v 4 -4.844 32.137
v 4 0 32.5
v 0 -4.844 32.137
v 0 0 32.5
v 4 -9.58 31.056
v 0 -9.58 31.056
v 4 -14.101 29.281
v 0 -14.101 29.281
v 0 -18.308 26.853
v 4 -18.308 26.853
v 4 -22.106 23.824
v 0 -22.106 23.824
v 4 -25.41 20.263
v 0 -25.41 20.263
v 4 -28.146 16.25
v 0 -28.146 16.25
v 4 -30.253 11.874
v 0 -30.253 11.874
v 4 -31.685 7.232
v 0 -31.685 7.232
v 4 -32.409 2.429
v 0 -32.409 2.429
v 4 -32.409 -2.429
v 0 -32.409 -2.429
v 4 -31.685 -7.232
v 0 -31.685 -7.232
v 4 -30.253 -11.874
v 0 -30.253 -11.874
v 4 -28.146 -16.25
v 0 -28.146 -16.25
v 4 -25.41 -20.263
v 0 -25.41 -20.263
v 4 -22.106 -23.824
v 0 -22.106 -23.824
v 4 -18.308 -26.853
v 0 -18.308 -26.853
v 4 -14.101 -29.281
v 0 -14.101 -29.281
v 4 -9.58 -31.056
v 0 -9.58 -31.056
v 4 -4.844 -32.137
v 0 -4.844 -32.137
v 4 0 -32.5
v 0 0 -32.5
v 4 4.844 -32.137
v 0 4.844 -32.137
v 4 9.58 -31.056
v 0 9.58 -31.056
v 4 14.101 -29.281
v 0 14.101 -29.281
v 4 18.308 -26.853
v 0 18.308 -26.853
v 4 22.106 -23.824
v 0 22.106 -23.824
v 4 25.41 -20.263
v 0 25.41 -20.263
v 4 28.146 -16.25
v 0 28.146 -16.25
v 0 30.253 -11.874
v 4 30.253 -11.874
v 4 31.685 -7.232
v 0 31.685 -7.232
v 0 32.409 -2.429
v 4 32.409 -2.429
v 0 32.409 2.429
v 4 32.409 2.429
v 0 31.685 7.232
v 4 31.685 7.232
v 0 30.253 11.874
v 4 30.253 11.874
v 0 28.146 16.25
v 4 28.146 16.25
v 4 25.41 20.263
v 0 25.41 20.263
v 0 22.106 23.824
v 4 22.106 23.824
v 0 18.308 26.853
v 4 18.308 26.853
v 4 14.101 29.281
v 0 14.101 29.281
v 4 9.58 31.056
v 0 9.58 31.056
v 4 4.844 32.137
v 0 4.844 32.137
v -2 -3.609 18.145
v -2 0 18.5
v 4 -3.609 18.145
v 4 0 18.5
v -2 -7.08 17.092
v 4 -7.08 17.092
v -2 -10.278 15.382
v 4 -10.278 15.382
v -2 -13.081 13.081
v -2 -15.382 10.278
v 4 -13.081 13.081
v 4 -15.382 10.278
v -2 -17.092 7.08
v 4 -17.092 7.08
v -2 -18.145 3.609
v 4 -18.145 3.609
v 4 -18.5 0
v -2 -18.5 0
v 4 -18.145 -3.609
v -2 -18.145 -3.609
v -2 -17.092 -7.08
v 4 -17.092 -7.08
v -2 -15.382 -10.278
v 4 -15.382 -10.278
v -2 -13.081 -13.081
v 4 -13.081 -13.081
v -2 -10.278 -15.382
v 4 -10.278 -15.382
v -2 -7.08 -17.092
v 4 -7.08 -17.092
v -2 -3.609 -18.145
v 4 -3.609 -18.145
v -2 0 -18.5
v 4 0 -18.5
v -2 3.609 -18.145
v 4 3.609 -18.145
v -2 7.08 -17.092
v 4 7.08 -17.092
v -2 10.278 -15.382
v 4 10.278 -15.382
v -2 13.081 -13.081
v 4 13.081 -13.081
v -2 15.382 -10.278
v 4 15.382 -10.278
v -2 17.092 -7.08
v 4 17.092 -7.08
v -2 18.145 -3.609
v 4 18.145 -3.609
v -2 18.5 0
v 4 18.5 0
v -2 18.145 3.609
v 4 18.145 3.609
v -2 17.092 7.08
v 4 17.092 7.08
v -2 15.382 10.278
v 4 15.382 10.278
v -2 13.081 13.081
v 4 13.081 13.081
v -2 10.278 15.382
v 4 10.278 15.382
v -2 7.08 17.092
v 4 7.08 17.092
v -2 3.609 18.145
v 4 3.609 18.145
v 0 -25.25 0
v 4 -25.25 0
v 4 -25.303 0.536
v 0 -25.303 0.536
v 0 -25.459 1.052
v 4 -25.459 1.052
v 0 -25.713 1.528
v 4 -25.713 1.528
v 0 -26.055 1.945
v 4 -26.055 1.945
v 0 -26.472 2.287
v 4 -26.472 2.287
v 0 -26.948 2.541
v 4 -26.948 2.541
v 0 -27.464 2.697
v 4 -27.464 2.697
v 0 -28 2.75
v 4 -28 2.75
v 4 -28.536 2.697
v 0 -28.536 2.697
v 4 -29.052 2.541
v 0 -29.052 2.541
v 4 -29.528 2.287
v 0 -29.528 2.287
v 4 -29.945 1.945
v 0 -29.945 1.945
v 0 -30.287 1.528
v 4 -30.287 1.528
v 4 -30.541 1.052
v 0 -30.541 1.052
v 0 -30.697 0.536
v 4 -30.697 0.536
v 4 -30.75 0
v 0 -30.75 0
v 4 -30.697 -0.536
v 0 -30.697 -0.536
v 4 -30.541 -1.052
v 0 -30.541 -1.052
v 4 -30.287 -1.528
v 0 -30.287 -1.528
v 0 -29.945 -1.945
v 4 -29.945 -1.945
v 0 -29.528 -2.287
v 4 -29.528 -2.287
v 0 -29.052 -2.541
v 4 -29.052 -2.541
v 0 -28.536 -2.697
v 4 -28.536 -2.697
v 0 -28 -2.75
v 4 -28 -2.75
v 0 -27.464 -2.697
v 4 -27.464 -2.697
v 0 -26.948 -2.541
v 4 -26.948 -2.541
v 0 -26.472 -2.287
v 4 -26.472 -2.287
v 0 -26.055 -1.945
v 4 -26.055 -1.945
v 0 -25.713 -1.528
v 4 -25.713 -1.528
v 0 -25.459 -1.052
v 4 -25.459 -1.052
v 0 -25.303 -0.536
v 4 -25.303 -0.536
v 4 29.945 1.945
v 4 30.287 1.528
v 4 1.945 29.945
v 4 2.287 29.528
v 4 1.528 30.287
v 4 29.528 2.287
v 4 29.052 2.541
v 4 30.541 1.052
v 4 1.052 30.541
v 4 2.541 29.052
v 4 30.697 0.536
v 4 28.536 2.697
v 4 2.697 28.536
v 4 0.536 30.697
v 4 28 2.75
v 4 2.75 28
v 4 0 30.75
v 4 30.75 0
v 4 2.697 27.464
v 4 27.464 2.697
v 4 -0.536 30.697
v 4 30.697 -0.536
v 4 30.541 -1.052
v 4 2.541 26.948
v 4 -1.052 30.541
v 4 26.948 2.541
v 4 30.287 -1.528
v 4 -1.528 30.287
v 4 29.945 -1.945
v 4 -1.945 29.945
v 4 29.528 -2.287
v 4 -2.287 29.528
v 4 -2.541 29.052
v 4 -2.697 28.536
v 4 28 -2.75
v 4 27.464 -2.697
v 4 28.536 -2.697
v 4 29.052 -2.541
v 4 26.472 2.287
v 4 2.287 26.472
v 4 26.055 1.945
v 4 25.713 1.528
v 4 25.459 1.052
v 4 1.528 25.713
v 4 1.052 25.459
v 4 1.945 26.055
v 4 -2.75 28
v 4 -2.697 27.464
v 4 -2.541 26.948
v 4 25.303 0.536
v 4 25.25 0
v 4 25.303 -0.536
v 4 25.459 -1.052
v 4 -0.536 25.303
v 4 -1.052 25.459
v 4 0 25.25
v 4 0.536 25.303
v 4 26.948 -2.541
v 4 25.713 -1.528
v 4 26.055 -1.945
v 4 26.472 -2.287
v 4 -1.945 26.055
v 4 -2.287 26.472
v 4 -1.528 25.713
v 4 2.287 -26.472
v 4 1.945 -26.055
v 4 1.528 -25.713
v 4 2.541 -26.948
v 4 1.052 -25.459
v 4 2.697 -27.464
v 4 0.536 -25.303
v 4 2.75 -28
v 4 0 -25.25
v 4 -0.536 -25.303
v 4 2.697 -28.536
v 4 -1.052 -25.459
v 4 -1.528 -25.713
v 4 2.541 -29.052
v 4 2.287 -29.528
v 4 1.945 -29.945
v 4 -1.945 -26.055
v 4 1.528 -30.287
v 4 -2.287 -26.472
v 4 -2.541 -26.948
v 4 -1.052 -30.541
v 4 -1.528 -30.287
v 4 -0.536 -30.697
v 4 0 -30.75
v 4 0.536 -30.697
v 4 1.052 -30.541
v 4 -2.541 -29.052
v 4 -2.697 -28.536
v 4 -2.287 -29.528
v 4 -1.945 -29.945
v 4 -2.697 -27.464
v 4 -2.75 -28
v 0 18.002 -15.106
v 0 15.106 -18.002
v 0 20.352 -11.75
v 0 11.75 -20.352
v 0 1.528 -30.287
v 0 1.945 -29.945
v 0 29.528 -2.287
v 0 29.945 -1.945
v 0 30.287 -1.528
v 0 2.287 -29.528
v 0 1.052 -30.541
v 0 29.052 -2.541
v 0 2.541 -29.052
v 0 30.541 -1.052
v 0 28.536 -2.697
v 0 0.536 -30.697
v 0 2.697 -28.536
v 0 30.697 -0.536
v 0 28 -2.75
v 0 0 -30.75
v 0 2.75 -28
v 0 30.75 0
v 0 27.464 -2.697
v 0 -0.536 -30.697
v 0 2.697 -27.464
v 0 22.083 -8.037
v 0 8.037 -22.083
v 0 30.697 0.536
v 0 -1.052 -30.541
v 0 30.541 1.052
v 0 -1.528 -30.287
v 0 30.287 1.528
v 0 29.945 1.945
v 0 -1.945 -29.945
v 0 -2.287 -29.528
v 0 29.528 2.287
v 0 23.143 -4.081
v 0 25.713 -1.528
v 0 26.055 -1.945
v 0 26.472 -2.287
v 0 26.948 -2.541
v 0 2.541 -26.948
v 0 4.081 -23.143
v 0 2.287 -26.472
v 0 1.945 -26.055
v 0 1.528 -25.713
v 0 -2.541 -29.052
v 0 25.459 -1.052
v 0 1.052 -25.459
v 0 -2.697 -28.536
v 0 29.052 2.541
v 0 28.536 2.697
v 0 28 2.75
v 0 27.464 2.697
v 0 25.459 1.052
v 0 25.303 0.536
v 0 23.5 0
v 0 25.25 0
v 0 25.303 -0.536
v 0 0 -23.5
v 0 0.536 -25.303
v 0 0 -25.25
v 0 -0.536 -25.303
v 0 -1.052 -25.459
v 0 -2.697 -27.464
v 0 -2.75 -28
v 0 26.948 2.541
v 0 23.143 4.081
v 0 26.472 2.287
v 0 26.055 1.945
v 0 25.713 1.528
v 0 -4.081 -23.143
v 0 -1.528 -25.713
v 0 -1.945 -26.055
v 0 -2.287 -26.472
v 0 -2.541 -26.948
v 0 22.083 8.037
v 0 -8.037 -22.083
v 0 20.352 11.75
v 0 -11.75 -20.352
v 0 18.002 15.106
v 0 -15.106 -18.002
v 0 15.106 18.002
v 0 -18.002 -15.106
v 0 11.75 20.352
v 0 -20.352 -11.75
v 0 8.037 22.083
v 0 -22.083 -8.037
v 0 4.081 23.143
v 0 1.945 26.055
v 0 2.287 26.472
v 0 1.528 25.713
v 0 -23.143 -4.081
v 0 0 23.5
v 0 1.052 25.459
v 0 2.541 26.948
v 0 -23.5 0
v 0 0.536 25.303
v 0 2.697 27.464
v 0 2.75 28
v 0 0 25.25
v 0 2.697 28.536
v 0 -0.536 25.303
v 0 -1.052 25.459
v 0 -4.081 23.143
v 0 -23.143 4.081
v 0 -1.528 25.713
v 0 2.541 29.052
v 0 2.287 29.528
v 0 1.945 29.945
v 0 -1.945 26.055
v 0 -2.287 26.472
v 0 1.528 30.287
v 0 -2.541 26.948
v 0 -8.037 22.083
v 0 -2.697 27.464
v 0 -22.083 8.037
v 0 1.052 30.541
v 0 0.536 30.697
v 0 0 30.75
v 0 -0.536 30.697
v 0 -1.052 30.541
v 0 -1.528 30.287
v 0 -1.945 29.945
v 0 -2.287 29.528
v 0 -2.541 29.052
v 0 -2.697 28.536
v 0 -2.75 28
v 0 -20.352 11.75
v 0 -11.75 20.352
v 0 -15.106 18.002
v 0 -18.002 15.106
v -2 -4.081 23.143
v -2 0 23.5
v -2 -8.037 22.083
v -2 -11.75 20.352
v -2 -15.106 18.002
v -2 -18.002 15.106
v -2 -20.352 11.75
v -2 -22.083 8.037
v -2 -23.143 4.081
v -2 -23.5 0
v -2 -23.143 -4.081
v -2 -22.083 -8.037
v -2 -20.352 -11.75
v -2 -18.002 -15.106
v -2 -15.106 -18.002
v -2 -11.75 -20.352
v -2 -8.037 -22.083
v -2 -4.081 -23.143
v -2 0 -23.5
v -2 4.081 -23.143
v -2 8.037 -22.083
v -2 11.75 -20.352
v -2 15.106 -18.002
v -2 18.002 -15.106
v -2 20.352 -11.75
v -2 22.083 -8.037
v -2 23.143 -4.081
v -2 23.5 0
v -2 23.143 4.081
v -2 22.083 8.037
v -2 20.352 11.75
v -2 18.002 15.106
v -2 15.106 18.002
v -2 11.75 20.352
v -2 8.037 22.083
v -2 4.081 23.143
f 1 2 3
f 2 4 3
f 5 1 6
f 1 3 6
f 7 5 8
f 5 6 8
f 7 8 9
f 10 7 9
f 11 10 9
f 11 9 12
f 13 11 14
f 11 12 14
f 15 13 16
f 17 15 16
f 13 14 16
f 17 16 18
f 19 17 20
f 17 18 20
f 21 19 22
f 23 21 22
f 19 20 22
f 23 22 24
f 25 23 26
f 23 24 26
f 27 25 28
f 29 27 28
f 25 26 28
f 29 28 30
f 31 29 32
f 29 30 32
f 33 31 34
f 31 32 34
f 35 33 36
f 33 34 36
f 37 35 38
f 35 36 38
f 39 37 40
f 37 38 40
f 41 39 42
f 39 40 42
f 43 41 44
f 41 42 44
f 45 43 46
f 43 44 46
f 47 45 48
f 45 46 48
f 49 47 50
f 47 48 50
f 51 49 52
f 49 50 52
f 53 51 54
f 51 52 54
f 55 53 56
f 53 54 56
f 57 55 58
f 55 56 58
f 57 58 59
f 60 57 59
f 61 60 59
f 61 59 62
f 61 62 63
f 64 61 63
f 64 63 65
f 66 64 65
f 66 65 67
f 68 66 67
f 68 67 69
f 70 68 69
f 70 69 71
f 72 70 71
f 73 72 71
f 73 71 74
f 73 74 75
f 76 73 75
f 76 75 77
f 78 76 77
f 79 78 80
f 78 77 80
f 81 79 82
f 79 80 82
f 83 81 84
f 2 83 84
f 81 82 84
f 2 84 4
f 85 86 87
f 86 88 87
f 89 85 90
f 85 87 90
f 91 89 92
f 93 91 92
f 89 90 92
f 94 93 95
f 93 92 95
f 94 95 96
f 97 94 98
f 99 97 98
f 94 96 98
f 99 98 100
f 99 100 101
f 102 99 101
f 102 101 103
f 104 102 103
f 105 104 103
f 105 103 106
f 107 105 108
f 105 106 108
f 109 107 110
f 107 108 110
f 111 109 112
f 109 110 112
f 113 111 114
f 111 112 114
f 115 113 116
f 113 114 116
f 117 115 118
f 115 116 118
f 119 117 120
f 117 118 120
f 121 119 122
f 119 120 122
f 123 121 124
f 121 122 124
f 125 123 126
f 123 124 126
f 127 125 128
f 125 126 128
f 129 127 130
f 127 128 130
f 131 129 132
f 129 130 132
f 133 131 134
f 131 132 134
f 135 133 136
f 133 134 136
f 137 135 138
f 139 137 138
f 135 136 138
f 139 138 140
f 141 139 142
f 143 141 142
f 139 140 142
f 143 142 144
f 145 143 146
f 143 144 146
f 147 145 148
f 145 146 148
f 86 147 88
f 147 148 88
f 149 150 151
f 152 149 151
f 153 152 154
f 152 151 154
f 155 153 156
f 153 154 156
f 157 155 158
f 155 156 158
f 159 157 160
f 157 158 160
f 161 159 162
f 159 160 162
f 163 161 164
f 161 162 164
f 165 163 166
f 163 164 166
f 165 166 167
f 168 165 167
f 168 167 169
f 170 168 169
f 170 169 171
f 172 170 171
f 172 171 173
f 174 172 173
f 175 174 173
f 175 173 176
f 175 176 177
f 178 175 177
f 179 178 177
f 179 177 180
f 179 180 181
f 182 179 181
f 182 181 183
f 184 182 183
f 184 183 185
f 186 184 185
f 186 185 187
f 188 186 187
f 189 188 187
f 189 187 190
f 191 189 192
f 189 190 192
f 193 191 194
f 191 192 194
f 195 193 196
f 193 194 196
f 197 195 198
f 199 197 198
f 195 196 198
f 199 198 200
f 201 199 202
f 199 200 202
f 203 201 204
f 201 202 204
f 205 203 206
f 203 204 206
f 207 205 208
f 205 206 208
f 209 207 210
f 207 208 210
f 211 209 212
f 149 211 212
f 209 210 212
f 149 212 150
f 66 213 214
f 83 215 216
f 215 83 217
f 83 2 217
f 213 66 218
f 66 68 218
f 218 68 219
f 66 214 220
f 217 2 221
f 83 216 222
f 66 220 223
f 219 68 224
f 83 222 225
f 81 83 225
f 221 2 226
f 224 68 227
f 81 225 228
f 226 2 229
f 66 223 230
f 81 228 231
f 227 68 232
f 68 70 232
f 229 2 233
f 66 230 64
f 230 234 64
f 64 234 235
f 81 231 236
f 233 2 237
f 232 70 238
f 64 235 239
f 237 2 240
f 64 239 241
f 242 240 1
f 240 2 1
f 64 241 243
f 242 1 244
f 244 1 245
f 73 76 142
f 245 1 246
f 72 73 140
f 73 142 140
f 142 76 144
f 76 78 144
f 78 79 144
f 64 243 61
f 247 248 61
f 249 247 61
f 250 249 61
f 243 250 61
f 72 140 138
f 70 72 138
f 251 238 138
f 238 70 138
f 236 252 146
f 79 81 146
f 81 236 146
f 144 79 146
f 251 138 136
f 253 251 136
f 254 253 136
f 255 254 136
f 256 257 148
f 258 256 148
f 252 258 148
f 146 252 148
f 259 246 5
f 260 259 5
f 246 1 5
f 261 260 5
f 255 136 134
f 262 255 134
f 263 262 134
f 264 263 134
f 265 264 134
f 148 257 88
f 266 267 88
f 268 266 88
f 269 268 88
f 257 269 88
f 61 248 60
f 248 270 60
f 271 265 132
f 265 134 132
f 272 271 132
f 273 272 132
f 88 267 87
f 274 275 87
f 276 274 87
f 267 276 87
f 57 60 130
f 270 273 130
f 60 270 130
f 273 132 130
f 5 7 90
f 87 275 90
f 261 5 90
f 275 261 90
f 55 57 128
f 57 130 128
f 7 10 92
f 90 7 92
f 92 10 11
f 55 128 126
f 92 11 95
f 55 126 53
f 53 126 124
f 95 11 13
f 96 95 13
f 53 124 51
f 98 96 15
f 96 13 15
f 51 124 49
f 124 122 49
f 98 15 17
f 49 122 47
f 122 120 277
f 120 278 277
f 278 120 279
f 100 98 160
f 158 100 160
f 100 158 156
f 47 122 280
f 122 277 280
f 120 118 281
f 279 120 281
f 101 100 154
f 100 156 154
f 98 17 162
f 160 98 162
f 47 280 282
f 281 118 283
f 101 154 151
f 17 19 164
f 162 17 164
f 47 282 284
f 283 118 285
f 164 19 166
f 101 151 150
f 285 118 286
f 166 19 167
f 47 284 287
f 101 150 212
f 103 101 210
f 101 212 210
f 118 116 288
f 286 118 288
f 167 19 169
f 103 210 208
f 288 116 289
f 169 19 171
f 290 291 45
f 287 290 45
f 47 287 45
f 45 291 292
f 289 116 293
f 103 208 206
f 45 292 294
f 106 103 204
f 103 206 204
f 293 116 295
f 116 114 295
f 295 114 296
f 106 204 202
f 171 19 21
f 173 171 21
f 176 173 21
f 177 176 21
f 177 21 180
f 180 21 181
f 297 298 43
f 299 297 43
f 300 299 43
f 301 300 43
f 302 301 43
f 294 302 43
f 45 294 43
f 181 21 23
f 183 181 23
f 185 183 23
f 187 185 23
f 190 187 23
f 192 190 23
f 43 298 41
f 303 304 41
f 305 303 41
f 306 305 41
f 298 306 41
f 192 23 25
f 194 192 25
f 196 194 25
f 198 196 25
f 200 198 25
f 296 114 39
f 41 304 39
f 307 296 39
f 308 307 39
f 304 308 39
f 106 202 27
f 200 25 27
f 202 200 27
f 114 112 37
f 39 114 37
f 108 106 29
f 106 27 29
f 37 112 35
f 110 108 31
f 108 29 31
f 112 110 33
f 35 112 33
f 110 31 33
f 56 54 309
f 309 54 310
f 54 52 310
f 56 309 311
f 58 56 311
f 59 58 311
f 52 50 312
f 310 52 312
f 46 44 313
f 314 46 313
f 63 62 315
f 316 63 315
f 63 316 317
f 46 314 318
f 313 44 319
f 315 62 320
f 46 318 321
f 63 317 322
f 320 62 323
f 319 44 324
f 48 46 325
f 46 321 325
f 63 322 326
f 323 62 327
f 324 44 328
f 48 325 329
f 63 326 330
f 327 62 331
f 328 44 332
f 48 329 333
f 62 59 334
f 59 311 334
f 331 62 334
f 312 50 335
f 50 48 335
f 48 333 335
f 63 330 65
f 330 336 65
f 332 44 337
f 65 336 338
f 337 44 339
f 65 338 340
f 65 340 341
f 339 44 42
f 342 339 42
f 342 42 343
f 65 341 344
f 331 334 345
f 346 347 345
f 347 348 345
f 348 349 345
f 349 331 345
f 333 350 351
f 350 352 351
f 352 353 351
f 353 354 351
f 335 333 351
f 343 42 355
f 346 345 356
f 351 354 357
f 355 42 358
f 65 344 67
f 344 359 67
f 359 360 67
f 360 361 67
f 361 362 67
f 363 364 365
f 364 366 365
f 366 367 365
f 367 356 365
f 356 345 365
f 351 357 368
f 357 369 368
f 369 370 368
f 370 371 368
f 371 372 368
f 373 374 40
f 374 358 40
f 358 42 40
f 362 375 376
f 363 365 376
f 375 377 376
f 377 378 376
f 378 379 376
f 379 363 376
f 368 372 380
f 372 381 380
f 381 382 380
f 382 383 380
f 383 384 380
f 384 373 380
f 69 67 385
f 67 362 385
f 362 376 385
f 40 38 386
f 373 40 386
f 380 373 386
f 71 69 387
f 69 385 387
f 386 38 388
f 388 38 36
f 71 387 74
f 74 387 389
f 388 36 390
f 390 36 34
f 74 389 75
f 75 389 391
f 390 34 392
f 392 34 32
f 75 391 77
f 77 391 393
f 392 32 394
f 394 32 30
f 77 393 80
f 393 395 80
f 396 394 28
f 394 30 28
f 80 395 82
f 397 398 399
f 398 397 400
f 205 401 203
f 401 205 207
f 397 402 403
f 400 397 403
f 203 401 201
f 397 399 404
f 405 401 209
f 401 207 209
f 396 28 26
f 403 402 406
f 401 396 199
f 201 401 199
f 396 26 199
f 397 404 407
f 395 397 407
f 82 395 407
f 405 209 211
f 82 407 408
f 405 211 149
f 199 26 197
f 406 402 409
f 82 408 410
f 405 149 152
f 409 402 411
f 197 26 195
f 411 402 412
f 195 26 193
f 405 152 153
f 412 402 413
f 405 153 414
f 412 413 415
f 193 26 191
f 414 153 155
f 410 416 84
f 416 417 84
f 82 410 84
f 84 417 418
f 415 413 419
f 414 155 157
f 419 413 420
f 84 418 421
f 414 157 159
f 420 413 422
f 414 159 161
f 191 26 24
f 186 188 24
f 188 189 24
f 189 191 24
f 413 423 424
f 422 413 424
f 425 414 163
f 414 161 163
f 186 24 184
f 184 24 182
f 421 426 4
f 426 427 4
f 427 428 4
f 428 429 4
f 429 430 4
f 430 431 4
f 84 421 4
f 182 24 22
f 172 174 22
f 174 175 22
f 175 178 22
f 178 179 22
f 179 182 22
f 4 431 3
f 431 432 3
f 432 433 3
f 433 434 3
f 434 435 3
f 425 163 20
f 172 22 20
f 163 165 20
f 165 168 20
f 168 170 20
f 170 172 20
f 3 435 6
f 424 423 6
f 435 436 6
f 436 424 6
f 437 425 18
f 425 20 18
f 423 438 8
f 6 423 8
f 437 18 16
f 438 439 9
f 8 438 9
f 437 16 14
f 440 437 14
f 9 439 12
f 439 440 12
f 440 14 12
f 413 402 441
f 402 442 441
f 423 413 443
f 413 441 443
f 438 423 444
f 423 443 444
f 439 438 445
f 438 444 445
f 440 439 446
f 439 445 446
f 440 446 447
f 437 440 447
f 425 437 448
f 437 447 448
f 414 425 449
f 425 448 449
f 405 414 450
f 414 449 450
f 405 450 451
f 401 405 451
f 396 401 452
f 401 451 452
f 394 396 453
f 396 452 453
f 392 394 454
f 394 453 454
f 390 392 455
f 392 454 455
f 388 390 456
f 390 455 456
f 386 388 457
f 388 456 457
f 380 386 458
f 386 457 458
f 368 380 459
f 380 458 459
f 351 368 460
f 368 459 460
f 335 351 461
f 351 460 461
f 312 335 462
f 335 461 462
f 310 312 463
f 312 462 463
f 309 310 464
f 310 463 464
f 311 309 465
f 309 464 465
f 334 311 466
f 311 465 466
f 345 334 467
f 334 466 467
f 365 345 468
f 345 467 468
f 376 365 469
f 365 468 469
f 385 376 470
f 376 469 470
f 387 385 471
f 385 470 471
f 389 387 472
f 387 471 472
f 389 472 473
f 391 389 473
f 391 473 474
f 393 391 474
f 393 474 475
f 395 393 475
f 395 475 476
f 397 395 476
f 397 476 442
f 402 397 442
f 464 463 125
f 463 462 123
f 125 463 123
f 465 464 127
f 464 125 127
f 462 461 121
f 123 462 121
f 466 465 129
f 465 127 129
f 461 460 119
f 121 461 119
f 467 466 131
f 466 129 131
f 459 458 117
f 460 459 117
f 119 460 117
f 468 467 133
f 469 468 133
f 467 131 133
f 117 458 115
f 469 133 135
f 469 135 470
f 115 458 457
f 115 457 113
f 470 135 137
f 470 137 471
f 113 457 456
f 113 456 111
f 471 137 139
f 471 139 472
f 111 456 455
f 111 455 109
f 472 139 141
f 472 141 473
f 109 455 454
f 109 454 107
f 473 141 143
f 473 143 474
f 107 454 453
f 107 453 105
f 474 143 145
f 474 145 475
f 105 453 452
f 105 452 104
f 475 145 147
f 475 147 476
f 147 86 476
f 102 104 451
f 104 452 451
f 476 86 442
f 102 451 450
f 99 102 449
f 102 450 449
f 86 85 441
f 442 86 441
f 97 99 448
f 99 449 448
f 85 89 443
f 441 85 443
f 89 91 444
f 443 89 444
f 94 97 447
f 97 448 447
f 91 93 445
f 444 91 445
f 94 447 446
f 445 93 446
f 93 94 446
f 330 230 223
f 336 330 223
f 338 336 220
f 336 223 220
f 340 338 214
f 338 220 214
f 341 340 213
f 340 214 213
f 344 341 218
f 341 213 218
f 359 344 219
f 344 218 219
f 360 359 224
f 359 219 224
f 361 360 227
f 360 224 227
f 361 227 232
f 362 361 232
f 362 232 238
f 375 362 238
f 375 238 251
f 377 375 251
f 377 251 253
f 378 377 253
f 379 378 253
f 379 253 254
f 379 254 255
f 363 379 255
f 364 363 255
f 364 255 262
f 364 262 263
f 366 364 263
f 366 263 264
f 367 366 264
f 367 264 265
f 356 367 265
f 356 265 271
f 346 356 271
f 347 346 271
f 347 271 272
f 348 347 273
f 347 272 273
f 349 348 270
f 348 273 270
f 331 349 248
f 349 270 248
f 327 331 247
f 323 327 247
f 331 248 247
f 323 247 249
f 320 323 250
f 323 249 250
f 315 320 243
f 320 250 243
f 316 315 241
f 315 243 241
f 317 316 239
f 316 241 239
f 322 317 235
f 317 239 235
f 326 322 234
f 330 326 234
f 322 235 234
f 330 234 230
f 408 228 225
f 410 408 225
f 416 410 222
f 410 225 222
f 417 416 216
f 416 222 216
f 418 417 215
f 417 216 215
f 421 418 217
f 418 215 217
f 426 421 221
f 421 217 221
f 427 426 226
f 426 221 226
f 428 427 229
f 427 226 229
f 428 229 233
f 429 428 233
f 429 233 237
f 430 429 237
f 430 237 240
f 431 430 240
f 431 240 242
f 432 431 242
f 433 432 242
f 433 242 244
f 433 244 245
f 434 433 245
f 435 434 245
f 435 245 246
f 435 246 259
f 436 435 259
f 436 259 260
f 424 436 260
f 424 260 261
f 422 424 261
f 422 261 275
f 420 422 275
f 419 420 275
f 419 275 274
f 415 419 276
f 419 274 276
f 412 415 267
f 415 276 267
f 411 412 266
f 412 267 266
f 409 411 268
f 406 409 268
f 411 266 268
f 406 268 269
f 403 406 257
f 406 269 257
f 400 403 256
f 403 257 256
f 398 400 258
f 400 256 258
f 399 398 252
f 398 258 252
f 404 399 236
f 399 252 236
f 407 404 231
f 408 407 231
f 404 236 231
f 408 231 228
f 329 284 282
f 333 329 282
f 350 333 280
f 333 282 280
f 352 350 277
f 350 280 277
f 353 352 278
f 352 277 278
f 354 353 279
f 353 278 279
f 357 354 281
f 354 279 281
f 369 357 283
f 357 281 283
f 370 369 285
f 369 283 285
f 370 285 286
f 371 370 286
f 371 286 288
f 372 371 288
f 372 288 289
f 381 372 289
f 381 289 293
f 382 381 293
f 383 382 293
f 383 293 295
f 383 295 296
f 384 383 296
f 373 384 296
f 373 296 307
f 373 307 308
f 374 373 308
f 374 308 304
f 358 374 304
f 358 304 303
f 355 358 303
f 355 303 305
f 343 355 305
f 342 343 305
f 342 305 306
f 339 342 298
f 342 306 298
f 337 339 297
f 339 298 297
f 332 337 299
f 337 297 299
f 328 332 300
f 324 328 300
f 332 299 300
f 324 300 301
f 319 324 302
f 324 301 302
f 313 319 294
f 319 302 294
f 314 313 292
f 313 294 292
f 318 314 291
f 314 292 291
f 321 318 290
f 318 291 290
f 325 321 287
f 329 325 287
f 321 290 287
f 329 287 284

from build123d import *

# Parameters (mm, degrees)
F3_D = 5.5


with BuildPart() as f1:
    # F0 (on Front) → F1 (revolve)
    with BuildSketch(Plane.XZ):
        Polygon((4, 32.5), (0, 32.5), (0, 23.5), (-2, 23.5), (-2, 18.5), (4, 18.5), align=None)
    revolve(axis=Axis((1.6395361068, 0, 0), (1, 0, 0)))

    # F3 (through all)
    with Locations(Plane(origin=(0, 0, 0), x_dir=(0, -1, 0), z_dir=(-1, 0, 0))):
        with Locations((0, 28), (28, 0), (0, -28), (-28, 0)):
            Hole(F3_D / 2)


solid = f1.part
